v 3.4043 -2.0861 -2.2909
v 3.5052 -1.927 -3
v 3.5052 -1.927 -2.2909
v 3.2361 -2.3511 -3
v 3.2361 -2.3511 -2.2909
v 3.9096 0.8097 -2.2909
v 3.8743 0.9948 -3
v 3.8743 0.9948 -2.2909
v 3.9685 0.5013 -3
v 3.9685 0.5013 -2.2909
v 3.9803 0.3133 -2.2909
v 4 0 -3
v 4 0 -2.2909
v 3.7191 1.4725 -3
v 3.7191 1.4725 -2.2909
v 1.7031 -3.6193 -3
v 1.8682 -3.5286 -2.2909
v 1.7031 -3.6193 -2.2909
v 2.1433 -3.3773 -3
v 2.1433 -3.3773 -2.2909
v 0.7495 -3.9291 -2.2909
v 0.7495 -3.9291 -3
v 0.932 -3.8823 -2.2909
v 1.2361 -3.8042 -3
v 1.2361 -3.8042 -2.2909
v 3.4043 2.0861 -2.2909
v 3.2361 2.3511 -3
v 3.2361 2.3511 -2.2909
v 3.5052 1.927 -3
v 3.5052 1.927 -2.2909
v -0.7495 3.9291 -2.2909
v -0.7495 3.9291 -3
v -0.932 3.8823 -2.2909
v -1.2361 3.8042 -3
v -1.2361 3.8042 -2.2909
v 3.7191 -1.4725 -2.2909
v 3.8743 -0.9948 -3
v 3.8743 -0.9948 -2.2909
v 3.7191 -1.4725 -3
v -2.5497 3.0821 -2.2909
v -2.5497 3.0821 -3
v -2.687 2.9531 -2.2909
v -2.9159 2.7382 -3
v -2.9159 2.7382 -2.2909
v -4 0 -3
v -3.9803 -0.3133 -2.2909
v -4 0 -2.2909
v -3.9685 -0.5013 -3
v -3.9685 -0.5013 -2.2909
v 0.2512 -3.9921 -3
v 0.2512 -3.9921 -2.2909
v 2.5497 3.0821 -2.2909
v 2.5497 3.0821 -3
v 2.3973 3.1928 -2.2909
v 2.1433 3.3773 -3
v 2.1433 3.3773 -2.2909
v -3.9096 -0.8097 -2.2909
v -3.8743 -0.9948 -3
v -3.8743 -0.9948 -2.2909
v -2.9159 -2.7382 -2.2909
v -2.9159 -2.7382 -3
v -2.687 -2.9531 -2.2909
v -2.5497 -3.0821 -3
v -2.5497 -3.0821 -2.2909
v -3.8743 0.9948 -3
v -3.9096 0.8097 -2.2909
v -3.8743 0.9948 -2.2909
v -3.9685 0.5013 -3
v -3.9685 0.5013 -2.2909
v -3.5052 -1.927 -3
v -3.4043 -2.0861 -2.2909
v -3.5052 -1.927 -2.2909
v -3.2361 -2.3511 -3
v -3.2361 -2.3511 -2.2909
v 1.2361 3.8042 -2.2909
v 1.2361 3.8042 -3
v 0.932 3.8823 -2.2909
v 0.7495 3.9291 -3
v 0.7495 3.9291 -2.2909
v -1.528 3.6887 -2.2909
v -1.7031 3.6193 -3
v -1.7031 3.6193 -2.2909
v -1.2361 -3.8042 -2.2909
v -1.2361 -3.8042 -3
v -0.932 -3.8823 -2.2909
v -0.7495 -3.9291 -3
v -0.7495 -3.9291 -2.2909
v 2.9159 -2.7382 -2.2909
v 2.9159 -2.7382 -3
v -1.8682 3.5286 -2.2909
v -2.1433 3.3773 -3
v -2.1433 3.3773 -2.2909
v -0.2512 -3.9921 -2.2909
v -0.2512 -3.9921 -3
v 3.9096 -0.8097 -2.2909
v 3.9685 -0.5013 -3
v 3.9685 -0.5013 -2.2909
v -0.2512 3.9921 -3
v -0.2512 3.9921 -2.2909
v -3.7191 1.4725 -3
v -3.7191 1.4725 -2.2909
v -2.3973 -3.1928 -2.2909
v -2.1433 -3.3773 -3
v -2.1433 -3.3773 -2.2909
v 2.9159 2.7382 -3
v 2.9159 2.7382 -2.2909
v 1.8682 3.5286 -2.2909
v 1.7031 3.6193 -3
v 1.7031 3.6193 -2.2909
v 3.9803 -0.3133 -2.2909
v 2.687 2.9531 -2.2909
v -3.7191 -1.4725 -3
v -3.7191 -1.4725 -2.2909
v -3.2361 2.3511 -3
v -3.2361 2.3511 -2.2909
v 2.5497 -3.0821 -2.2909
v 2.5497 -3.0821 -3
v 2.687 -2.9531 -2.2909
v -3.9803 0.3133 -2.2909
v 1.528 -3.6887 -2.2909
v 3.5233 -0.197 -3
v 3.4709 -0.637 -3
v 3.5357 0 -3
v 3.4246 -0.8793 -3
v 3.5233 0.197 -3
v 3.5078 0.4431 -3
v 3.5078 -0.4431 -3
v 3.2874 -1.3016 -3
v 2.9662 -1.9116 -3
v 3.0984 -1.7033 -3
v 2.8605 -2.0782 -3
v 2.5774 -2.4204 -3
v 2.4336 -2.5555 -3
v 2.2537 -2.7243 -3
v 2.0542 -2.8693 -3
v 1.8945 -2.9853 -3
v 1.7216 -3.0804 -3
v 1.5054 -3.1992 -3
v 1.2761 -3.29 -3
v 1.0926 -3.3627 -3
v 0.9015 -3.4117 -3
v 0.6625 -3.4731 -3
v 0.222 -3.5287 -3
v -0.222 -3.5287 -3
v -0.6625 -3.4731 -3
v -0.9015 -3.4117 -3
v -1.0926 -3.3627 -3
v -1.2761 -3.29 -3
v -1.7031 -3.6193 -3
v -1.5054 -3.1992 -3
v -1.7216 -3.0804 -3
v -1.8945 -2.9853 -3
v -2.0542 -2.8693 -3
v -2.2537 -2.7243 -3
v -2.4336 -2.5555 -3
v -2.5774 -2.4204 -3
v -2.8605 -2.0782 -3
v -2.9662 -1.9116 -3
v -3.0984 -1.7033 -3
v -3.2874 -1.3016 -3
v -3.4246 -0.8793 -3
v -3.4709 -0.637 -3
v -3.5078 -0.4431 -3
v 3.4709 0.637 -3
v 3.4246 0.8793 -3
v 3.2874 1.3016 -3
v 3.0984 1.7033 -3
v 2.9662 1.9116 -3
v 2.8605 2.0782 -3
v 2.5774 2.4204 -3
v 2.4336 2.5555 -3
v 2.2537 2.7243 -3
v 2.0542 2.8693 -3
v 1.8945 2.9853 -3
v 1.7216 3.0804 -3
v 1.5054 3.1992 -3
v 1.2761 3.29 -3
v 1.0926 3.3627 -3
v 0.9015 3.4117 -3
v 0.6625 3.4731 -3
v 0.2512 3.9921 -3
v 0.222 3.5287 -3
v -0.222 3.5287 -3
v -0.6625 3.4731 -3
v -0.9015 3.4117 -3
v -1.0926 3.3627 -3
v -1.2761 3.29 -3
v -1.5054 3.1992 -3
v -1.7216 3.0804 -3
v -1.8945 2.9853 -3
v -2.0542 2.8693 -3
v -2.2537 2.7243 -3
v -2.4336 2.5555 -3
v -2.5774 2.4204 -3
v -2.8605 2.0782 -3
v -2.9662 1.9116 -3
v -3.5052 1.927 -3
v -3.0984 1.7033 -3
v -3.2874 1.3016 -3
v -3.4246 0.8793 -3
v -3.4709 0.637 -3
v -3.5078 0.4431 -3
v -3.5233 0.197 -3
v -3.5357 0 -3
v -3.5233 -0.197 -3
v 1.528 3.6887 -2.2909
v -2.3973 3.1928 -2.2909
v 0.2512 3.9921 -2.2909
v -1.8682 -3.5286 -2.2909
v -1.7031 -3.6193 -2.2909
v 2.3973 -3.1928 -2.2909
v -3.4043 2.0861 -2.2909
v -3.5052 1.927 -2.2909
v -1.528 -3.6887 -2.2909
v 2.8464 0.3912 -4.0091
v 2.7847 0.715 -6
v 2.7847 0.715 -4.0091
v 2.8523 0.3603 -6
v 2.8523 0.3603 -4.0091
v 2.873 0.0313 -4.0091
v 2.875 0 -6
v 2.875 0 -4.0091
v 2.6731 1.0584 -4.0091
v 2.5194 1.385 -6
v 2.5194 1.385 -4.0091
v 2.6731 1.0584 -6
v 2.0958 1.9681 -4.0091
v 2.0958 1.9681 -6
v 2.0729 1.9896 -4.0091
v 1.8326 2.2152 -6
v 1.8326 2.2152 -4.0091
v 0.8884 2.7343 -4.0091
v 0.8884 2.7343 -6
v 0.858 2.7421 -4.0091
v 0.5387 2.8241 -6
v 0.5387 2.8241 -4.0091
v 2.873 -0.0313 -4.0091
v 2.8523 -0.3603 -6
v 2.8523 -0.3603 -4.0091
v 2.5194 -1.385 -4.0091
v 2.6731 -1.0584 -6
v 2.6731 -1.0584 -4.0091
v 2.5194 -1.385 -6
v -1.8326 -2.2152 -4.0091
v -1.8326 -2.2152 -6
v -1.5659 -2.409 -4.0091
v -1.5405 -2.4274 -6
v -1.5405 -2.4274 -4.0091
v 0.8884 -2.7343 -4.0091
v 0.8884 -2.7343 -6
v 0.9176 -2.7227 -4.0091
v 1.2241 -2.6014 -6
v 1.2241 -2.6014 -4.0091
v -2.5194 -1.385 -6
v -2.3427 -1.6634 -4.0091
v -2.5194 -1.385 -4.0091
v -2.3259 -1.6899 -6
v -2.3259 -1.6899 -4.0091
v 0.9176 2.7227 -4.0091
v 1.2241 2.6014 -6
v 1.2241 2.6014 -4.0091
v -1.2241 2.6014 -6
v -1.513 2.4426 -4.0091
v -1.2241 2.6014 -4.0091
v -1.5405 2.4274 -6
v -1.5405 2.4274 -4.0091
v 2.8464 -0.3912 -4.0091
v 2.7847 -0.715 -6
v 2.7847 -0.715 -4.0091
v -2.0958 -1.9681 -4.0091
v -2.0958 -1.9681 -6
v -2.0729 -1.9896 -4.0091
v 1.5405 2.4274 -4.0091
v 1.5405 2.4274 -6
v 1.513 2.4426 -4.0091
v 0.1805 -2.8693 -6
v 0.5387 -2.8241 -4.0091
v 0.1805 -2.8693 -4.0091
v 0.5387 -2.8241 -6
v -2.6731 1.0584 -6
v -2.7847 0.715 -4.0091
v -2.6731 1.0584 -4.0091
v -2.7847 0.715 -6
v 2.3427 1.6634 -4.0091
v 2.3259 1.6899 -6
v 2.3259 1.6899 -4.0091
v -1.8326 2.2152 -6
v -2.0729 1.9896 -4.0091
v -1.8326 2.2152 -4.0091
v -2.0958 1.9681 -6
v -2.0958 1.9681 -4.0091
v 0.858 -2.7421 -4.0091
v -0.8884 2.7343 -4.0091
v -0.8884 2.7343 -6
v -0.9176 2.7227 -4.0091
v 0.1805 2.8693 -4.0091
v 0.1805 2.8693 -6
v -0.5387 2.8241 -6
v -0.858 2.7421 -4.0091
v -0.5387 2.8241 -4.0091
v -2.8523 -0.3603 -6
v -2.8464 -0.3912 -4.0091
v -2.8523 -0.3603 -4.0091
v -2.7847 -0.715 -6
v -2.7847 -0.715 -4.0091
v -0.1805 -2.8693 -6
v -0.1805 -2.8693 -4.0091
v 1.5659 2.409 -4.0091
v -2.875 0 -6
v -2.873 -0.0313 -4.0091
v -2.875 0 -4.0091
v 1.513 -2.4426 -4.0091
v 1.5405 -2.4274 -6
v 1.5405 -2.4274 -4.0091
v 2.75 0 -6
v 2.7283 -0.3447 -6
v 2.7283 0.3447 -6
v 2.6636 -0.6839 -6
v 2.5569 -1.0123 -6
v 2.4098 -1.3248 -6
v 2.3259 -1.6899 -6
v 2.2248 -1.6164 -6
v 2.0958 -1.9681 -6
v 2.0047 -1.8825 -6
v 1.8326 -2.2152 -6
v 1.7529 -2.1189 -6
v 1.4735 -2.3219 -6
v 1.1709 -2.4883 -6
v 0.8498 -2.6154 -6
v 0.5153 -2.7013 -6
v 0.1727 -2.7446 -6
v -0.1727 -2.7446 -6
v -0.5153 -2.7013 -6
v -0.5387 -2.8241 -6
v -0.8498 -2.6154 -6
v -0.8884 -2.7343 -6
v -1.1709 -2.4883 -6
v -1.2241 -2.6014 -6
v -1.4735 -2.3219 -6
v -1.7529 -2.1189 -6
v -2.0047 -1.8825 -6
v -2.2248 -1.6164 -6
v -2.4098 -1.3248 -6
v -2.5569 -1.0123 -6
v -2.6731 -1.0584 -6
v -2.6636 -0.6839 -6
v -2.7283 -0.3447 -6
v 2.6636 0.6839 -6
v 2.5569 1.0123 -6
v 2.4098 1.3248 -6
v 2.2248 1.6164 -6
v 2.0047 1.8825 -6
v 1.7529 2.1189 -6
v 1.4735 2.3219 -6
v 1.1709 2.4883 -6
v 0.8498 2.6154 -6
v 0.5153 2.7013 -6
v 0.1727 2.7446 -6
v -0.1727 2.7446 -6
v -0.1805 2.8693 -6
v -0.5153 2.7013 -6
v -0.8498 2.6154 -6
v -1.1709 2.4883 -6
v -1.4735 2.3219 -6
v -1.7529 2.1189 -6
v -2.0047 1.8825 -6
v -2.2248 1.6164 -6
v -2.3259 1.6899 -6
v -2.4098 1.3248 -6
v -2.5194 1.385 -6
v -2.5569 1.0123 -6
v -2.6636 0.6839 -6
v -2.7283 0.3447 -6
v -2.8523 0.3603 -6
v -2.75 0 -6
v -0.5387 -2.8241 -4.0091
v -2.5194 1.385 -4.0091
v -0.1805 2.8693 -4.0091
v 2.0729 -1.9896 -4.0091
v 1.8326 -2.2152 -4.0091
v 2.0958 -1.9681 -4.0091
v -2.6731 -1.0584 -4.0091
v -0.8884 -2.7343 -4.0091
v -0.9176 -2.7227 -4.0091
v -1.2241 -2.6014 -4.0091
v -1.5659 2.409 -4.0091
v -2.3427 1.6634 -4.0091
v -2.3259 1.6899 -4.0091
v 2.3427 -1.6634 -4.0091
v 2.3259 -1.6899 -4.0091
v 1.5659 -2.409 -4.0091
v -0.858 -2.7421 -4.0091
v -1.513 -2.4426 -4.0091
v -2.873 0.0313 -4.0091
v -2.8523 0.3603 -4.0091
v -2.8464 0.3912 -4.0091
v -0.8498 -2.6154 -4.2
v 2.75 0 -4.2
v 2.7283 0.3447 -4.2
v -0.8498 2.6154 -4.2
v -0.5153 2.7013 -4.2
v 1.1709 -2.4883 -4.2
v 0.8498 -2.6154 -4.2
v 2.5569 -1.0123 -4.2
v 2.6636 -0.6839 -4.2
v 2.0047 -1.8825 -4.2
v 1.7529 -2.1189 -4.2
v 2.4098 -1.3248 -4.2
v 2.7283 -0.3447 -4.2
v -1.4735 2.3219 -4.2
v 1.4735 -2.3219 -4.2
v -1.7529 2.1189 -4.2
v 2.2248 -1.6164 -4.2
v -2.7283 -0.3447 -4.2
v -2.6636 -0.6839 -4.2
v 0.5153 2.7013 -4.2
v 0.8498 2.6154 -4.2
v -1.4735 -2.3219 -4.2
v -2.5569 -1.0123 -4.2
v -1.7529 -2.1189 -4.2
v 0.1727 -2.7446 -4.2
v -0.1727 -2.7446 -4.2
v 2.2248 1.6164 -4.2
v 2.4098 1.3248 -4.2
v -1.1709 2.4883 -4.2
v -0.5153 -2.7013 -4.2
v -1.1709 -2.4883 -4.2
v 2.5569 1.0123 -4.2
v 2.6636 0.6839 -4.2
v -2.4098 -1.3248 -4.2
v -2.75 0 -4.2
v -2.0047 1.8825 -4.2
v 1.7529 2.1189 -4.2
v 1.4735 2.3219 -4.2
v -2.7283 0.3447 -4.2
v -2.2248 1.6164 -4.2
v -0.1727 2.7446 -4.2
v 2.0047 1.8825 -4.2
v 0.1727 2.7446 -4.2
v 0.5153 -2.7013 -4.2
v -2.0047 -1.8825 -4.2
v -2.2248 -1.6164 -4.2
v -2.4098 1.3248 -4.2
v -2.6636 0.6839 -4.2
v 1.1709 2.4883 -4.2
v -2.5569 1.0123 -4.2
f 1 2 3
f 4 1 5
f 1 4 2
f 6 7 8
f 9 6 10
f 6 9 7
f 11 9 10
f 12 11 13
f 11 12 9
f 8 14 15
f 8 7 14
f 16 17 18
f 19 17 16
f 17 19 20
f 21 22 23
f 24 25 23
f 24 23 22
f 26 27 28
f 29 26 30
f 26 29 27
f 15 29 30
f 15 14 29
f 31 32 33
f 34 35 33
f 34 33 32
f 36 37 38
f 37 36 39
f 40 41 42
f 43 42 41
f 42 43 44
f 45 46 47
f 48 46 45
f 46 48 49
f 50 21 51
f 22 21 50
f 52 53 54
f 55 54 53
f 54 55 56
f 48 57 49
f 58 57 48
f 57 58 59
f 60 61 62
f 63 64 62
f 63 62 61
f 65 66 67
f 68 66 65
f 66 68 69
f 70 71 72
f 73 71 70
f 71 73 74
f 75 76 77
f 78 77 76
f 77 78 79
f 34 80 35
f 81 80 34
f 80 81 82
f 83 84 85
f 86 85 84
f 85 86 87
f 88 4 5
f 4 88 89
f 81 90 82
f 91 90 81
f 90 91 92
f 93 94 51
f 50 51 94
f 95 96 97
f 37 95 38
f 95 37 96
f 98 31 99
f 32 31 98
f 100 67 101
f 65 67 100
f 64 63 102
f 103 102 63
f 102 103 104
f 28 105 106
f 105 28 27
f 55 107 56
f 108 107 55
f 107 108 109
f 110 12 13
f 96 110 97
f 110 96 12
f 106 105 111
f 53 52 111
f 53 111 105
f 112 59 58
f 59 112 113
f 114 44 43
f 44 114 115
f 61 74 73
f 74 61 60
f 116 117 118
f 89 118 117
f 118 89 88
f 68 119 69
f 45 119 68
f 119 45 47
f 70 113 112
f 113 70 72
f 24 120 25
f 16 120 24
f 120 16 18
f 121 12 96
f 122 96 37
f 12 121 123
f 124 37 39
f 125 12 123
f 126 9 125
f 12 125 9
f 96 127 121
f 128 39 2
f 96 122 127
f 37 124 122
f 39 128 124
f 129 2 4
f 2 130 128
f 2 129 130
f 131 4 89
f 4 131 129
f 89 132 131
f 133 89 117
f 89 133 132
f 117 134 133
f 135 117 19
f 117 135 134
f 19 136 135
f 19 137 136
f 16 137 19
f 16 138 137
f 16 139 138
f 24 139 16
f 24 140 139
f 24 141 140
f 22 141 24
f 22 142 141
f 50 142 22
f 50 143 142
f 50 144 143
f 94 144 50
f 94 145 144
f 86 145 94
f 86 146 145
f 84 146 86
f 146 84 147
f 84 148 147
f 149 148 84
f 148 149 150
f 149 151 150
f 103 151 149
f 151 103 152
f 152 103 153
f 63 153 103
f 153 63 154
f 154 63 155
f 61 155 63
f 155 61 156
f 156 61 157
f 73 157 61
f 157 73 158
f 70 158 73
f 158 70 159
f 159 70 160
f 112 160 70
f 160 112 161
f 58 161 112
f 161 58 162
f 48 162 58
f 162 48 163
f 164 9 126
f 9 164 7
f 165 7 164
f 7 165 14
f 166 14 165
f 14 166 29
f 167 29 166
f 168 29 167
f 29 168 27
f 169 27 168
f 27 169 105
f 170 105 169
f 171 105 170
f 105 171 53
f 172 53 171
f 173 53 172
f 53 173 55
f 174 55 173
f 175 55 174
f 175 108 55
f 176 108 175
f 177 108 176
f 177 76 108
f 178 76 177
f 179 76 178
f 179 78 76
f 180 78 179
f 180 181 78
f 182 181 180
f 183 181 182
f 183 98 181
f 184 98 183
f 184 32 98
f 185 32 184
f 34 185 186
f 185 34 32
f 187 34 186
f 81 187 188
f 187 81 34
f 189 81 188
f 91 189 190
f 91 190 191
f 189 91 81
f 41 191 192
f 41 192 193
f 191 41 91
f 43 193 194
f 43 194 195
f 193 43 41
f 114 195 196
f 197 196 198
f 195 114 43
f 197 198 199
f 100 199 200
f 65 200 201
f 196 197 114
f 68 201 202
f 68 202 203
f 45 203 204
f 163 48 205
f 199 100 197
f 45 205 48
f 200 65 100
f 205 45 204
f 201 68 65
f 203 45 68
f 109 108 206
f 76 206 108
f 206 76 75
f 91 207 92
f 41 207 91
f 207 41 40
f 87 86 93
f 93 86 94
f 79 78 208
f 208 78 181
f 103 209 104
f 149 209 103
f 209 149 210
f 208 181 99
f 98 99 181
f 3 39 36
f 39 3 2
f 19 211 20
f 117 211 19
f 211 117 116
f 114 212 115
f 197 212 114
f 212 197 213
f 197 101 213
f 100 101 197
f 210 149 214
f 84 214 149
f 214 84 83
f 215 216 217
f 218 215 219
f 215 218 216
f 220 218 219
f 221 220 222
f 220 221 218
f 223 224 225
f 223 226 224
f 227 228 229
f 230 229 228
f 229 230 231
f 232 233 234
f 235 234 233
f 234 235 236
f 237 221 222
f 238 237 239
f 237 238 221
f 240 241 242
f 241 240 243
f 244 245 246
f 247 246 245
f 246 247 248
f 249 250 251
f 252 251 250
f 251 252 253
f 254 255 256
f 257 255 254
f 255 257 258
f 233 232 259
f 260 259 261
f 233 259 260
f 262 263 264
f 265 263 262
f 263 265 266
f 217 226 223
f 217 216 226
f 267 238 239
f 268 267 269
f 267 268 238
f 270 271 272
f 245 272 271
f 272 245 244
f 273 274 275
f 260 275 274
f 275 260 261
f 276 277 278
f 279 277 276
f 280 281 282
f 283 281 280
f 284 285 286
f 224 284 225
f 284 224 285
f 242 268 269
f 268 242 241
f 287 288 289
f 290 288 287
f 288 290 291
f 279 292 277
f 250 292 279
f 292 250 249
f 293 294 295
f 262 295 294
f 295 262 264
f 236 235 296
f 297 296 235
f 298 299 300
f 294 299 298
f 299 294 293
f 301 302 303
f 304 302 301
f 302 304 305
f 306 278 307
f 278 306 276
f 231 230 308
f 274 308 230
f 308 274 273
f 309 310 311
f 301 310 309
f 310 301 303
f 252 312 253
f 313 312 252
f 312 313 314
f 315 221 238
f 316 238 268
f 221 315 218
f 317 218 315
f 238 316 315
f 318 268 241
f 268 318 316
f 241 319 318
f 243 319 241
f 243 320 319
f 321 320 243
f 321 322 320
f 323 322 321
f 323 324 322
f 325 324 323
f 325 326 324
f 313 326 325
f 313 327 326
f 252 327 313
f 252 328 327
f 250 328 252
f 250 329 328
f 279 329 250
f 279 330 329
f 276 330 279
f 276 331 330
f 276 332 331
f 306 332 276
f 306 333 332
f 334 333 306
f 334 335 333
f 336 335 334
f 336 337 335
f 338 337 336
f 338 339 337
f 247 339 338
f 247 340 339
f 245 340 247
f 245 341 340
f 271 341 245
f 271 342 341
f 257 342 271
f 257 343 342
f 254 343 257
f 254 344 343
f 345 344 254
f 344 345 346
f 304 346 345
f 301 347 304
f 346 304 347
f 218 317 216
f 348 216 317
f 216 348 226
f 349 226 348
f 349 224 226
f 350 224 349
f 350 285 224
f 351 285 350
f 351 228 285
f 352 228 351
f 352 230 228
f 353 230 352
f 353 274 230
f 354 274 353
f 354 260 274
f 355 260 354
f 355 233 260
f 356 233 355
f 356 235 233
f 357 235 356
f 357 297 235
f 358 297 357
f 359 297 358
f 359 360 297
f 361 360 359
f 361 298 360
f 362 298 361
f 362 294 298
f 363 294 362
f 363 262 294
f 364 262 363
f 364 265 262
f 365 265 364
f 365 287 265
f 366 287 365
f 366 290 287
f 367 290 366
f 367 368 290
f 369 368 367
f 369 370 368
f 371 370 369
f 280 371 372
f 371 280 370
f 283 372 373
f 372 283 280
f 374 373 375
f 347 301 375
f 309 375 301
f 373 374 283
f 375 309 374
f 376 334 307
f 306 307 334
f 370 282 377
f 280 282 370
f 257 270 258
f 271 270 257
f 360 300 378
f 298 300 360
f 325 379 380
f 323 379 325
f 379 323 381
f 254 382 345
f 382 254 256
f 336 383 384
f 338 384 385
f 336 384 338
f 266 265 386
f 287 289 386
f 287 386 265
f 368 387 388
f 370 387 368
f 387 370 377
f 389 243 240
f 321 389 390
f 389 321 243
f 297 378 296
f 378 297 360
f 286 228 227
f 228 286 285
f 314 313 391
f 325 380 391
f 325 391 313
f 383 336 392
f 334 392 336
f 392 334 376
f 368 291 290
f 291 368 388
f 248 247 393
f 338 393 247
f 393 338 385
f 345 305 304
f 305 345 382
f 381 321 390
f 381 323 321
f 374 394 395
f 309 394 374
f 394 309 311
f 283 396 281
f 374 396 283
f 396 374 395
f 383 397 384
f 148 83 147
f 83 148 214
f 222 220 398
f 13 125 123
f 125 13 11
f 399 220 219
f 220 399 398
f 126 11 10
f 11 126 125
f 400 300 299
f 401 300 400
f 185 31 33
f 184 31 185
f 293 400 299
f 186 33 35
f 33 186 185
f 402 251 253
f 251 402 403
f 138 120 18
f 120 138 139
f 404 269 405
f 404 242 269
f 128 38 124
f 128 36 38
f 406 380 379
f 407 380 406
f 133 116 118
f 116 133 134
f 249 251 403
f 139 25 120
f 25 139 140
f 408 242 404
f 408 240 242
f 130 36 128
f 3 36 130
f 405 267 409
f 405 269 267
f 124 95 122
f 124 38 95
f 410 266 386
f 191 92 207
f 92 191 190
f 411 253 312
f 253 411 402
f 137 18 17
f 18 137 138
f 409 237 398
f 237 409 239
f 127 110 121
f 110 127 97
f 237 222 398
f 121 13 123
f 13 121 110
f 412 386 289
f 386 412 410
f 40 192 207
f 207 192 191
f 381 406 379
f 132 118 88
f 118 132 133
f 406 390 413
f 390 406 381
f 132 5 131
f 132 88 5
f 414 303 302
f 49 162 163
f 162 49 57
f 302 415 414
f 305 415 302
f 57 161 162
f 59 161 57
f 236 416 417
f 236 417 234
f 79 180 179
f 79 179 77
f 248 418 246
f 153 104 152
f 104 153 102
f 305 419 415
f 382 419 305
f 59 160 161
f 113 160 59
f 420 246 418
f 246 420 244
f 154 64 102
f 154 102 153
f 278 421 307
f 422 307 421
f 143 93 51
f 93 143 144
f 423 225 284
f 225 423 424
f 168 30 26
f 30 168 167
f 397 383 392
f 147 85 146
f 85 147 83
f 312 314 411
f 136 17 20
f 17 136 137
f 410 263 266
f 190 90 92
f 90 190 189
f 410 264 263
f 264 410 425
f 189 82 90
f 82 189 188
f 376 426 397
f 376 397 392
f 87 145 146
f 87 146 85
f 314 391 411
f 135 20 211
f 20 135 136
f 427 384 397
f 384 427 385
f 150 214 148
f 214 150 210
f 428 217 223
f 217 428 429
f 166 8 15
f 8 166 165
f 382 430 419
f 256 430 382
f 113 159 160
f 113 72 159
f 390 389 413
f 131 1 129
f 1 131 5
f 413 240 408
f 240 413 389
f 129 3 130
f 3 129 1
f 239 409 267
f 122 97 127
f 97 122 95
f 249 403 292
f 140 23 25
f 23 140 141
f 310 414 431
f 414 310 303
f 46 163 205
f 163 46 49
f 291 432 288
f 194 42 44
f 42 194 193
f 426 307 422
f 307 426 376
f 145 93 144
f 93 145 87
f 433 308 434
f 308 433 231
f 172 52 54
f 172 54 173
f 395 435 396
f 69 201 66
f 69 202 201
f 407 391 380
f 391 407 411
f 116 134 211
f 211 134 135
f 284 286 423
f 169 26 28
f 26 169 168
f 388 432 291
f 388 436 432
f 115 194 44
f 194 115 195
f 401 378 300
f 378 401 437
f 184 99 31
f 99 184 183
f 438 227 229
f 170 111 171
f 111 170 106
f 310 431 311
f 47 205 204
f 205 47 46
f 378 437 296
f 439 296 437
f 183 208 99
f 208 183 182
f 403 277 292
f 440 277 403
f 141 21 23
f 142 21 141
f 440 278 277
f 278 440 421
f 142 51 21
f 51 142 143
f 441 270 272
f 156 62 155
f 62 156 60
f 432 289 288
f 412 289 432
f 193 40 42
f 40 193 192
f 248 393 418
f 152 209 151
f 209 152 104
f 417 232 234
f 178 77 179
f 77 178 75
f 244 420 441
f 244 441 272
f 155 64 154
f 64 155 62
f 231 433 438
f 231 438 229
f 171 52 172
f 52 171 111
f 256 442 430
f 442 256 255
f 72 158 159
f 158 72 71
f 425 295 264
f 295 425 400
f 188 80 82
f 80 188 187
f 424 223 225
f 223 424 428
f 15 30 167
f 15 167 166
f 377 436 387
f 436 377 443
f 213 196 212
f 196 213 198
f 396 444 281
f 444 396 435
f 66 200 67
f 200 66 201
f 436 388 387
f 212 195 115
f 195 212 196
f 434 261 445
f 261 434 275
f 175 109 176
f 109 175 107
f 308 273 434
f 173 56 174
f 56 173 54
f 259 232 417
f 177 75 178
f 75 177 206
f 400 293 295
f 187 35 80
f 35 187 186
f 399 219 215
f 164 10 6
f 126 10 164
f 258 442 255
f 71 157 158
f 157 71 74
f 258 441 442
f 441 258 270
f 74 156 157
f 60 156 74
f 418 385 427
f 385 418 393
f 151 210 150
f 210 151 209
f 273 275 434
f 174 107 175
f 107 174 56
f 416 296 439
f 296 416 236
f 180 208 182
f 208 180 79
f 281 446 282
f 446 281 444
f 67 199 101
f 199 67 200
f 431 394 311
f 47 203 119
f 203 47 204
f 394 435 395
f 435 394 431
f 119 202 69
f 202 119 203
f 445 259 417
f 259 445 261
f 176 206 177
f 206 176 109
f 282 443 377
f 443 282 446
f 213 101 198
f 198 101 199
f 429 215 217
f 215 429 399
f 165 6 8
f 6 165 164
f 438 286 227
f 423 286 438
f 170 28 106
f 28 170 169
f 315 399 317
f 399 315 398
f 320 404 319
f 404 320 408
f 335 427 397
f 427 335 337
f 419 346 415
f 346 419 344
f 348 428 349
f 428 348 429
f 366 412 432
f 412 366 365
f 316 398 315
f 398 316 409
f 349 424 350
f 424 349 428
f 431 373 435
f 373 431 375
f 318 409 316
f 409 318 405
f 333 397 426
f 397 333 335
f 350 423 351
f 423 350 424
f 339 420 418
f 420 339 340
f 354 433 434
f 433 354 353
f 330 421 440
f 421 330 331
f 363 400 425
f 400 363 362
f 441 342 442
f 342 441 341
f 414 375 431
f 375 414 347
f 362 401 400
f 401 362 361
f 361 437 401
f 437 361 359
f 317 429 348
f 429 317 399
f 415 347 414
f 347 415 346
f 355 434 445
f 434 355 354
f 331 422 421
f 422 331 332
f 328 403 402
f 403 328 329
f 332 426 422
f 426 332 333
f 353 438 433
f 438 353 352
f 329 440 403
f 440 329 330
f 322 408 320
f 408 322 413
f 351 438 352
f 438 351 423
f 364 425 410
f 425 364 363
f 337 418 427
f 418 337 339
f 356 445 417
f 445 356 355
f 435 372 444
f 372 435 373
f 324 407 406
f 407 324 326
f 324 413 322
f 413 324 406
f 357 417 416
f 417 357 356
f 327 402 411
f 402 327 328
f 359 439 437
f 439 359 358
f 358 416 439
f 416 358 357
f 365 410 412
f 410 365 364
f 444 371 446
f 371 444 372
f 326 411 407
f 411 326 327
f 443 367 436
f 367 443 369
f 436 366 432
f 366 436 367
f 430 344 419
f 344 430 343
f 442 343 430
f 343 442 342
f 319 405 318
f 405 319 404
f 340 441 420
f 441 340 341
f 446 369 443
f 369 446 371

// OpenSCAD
$fn = 50;

difference() {
	union() {
		translate(v = [0, 0, -3.0]) {
			cylinder(h = 6, r = 4.0);
		}
		#translate(v = [0, 0, -6.0]) {
			cylinder(h = 6, r = 2.875);
		}
	}
	union() {
		translate(v = [0, 0, 0]) {
			rotate(a = [0, 0, 0]) {
				difference() {
					union() {
						translate(v = [0, 0, -6.0]) {
							cylinder(h = 6, r = 2.25);
						}
						translate(v = [0, 0, -4.2]) {
							cylinder(h = 4.2, r1 = 2.75, r2 = 5.5);
						}
						translate(v = [0, 0, -6.0]) {
							cylinder(h = 6, r = 2.75);
						}
						translate(v = [0, 0, -6.0]) {
							cylinder(h = 6, r = 2.25);
						}
					}
					union();
				}
			}
		}
		#cylinder(h = 3, r = 6.25);
	}
}
